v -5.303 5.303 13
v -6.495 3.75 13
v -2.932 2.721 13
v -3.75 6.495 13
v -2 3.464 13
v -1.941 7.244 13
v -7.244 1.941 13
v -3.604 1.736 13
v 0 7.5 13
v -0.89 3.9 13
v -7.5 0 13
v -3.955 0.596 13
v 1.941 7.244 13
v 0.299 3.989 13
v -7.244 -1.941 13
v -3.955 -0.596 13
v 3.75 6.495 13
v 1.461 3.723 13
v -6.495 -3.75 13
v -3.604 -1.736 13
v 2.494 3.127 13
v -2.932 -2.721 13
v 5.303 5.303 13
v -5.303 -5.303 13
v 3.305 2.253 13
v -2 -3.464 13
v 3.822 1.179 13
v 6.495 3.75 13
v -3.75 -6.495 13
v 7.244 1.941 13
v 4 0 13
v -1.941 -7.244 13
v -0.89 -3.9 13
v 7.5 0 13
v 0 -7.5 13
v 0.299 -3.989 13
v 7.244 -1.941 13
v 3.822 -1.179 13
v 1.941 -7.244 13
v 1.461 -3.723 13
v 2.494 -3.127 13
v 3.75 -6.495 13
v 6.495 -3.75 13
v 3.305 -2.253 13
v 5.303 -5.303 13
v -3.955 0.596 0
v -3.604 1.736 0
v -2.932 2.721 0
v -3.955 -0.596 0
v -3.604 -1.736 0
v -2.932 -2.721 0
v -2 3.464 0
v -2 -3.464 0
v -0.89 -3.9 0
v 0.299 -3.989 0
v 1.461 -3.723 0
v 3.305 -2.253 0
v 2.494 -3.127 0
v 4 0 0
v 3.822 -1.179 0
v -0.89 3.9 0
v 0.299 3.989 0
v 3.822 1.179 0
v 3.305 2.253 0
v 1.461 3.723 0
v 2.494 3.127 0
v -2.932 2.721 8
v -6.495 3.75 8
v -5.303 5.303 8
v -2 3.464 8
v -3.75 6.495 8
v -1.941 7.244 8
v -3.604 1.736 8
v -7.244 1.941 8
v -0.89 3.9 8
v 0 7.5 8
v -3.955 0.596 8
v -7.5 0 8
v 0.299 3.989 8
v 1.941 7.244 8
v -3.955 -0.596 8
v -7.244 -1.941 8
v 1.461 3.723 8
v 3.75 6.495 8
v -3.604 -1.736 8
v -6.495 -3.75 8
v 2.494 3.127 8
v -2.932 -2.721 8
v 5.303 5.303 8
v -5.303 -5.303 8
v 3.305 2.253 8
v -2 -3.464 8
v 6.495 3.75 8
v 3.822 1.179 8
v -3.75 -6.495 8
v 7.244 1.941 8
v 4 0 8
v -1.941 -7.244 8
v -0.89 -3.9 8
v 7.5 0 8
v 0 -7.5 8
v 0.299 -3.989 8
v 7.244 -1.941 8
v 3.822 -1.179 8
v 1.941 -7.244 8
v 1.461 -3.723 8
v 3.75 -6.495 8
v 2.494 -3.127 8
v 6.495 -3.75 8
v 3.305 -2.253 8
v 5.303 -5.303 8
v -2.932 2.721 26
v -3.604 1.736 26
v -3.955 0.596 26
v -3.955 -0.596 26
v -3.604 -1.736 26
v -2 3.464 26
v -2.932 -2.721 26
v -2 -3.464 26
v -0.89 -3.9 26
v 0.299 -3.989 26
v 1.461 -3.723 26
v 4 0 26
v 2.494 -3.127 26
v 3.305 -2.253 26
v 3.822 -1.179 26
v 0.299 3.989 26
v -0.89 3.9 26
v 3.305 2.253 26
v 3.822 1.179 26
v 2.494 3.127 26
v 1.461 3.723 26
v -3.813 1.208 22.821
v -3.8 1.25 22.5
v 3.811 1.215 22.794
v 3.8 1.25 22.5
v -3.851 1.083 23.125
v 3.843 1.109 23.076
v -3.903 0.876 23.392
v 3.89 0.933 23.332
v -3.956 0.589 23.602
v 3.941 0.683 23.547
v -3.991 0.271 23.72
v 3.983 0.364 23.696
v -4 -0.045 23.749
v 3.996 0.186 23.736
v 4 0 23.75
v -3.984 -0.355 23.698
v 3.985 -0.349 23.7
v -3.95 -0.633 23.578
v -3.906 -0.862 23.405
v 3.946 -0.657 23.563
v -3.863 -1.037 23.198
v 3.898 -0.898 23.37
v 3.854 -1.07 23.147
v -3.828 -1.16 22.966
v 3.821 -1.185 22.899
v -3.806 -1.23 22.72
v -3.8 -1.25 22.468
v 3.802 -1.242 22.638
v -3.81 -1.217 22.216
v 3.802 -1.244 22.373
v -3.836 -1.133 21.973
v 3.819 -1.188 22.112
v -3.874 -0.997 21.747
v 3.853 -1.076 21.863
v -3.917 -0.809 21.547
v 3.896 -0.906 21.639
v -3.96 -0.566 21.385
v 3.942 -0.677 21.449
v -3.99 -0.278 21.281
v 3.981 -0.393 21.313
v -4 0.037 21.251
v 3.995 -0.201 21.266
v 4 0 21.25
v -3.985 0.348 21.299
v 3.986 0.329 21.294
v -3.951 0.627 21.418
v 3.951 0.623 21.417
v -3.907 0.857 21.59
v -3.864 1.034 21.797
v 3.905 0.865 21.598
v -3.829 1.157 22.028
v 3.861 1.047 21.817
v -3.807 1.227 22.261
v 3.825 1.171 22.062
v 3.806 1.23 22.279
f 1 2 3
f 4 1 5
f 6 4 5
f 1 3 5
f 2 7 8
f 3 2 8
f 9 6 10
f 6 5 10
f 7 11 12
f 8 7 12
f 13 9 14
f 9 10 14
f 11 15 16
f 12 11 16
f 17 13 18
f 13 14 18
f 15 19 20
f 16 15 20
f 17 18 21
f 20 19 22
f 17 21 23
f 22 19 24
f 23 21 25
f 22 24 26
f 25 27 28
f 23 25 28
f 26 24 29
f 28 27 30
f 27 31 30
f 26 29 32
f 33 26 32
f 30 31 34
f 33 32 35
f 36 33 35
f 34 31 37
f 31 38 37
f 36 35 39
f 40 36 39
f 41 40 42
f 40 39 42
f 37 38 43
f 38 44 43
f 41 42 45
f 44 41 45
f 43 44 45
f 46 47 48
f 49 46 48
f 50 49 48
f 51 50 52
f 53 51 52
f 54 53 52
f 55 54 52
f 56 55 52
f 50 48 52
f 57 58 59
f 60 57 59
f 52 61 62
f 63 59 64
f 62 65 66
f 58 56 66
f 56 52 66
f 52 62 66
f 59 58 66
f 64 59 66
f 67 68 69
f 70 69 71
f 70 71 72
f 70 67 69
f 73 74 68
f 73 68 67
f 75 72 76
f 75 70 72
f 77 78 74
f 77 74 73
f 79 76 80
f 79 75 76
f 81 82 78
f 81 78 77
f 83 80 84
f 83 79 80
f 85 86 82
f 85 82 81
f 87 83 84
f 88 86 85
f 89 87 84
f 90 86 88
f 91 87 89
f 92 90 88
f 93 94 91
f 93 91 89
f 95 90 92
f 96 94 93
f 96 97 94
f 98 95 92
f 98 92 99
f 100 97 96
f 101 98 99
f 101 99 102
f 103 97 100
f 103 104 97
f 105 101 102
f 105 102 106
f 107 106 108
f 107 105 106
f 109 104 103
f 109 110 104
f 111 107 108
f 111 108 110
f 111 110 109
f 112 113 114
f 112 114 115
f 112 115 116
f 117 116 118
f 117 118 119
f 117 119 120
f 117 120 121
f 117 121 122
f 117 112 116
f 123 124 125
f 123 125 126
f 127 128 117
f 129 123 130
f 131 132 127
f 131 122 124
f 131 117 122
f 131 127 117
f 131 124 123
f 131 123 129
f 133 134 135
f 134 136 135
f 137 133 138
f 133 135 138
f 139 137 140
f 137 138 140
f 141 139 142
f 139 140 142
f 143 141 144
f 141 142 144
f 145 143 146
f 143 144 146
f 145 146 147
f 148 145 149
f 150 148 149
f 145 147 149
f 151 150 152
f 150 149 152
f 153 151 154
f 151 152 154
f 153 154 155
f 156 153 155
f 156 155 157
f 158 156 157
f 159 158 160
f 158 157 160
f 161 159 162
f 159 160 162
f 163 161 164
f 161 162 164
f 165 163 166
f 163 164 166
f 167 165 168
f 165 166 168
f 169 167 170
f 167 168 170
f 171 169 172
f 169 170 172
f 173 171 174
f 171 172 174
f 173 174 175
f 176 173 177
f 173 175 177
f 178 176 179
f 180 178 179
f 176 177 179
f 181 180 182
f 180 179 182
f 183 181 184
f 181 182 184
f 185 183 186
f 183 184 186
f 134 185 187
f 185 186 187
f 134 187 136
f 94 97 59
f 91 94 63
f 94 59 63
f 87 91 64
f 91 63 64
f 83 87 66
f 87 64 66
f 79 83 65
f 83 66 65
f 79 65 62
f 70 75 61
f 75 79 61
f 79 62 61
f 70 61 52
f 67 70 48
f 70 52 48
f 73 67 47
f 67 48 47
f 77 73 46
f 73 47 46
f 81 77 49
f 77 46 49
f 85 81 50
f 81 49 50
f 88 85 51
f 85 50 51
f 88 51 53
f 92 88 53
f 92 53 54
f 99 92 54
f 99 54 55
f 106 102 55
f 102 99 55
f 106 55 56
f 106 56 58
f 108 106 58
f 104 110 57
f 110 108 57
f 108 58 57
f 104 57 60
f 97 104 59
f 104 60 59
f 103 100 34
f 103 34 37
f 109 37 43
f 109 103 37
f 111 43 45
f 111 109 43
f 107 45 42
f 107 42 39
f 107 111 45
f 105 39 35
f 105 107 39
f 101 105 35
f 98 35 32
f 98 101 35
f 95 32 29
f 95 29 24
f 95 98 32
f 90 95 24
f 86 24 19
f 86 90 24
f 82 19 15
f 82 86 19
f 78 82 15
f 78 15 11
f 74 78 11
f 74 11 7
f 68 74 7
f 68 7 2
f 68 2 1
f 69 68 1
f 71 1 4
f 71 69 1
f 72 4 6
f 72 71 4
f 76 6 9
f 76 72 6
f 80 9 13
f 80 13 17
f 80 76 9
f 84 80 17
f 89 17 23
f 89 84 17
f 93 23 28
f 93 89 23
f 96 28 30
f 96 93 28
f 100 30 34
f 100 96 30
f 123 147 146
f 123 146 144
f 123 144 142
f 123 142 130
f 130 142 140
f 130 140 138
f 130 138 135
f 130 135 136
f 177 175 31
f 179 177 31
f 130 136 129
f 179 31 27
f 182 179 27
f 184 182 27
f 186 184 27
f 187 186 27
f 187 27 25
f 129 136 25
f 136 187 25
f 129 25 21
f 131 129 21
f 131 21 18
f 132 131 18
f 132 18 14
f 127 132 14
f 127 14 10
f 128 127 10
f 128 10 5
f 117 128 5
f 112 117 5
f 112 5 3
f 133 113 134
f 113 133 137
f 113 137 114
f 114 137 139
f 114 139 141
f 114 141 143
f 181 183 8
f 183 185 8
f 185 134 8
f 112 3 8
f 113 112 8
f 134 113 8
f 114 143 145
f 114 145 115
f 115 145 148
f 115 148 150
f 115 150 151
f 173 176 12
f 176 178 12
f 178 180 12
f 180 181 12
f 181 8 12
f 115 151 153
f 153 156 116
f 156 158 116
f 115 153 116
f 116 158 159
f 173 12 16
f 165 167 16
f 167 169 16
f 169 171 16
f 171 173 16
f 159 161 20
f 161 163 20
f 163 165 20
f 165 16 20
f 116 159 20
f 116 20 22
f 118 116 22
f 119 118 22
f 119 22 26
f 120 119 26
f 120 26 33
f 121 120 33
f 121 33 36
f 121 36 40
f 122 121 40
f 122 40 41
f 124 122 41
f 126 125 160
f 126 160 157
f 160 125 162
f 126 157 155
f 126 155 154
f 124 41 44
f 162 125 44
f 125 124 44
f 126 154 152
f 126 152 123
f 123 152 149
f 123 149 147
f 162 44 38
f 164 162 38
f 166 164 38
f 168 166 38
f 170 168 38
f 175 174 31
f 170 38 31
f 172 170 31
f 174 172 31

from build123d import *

# Parameters (mm, degrees)
F0_R     = 4
F1_DEPTH = 26
F3_R     = 7.5
F4_DEPTH = 5
F5_R     = 1.25
F6_DEPTH = 12.5


with BuildPart() as f1:
    # F0 (on Top) → F1 (new body)
    with BuildSketch(Plane.XY):
        Circle(F0_R)
    extrude(amount=F1_DEPTH)

    # F3 (on offset) → F4 (join)
    with BuildSketch(Plane(origin=(0, 0, 8), x_dir=(1, 0, 0), z_dir=(0, 0, -1))):
        Circle(F3_R)
    extrude(amount=-F4_DEPTH)

    # F5 (on Right) → F6 (cut, symmetric)
    with BuildSketch(Plane.YZ):
        with Locations((0, 22.5)):
            Circle(F5_R)
    extrude(amount=F6_DEPTH, both=True, mode=Mode.SUBTRACT)


solid = f1.part
